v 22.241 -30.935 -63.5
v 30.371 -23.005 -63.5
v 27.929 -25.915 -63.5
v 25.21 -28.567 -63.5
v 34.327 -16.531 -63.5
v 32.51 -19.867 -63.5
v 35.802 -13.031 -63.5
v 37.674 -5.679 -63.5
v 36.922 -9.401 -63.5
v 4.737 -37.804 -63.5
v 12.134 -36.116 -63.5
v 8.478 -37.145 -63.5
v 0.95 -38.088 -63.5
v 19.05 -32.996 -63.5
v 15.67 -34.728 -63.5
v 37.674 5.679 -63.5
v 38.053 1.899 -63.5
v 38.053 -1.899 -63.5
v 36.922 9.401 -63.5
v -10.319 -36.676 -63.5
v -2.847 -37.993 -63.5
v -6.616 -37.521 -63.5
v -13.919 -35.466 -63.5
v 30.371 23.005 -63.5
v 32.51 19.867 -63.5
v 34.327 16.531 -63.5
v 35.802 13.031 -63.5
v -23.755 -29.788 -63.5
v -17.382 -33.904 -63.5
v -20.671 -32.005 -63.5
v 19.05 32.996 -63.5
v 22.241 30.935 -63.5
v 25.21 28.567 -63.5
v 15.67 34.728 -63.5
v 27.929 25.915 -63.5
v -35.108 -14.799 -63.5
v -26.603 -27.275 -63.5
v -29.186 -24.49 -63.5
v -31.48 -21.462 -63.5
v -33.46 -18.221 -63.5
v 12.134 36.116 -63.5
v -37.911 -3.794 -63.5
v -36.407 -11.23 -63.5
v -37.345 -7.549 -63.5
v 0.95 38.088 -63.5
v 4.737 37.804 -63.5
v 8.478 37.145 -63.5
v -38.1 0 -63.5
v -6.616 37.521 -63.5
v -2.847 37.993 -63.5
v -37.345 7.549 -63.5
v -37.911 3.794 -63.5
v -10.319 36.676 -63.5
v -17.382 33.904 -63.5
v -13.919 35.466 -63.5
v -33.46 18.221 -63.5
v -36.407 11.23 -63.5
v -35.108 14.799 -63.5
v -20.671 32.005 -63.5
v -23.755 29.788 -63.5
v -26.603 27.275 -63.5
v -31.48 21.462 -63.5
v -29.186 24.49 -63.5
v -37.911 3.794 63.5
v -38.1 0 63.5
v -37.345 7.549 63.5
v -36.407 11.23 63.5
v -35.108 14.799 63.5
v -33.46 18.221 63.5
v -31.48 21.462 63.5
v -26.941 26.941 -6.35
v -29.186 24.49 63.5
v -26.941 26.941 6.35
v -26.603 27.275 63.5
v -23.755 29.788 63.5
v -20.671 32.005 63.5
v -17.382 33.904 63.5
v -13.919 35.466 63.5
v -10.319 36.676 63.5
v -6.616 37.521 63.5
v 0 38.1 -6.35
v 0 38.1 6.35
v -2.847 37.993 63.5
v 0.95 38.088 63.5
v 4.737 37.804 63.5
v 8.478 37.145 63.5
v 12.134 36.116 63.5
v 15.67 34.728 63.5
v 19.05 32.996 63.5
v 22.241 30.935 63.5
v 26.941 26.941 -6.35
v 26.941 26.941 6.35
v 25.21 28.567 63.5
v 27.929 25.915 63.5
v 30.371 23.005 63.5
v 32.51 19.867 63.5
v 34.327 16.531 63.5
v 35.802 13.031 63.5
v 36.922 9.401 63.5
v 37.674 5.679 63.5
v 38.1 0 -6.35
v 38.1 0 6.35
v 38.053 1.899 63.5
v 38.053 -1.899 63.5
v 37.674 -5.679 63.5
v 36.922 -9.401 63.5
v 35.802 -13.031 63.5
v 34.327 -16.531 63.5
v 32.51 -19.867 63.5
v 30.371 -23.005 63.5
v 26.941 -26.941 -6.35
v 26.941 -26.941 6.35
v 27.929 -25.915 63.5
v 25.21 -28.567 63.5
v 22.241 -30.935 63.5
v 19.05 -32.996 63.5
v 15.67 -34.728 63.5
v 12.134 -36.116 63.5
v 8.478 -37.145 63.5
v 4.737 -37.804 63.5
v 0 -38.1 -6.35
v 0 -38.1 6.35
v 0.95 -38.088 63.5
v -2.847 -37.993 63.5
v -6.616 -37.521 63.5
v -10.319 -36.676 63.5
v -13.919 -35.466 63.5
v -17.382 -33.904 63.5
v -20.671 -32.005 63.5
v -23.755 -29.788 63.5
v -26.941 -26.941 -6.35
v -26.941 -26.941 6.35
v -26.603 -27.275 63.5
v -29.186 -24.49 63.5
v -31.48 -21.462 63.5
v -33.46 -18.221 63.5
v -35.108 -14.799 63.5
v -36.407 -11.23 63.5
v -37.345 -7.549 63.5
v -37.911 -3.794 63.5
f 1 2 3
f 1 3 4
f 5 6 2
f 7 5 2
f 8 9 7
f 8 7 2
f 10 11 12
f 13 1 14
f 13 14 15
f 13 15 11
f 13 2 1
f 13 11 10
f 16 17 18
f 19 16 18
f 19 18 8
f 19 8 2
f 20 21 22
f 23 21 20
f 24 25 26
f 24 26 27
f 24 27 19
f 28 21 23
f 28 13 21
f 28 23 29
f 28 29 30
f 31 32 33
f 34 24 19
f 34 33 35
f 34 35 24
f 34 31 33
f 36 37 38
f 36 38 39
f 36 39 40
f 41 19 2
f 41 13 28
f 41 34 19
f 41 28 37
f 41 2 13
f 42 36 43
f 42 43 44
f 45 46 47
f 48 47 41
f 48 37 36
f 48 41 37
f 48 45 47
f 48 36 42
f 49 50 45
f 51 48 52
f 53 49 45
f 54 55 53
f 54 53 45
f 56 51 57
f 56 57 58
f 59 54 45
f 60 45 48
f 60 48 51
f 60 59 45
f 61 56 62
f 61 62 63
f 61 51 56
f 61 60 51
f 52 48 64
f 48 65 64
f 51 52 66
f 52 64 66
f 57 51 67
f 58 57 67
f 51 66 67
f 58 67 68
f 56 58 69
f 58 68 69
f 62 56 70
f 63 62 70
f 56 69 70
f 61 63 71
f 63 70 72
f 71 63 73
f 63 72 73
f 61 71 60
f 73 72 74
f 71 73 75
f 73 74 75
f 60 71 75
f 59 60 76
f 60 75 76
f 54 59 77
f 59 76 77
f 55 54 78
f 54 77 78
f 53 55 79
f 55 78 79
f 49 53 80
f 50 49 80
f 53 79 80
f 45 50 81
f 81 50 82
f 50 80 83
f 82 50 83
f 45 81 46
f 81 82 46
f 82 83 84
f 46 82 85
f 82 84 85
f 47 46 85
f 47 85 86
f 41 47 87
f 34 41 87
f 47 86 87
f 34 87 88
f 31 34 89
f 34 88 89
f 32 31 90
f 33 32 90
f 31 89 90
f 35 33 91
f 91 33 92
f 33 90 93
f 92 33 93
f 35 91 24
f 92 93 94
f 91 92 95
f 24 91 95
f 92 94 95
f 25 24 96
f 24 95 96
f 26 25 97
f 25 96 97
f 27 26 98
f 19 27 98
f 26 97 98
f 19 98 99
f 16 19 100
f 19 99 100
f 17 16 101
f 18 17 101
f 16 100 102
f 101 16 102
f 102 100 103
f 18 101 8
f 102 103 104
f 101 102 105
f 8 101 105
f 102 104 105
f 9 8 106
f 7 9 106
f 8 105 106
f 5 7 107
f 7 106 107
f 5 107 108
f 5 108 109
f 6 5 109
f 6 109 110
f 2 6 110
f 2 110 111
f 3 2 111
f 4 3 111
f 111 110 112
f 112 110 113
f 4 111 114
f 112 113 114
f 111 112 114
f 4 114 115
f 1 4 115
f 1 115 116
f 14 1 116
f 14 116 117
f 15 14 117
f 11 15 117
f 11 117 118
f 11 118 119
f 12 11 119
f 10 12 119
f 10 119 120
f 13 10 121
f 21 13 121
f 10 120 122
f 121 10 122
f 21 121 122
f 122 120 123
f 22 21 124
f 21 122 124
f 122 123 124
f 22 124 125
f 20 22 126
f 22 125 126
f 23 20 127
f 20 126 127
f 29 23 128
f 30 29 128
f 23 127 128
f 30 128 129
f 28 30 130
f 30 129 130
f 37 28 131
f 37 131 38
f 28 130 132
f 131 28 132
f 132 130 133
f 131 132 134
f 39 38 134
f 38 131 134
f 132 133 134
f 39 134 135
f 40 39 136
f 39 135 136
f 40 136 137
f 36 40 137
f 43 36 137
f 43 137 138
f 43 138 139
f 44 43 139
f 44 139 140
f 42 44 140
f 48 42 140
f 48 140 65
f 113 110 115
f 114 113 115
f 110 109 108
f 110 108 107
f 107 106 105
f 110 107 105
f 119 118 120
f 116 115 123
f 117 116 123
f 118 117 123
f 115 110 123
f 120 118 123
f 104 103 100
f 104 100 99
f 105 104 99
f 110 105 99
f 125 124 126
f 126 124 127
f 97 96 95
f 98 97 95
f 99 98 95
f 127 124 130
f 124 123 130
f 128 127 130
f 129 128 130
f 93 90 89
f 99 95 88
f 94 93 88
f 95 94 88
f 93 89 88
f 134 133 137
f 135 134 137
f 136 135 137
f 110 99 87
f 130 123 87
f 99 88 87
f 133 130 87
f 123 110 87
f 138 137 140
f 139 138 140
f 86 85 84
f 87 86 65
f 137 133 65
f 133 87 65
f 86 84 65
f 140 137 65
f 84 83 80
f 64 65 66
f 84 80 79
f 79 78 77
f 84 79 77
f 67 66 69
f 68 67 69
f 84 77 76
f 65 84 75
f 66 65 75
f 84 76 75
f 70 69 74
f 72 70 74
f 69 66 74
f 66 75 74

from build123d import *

# Parameters (mm, degrees)
F0_W     = 38.1
F0_H     = 127
F3_R     = 6.35
F4_DEPTH = 12.7
F5_COUNT = 8


with BuildPart() as f1:
    # F0 (on Front) → F1 (revolve)
    with BuildSketch(Plane.XZ):
        with Locations((-19.05, 0)):
            Rectangle(F0_W, F0_H)
    revolve(axis=Axis((0, 0, 0), (0, 0, -1)))


with BuildPart() as f4:
    # F3 (on offset) → F4 (new body)
    with BuildSketch(Plane.XZ.offset(38.1)):
        Circle(F3_R)
    extrude(amount=F4_DEPTH)


with BuildPart() as f5_1:
    # F5: instance of F4
    add(f4.part.rotate(Axis((0, 0, 63.5), (0, 0, -1)), 1 * 360 / F5_COUNT))


with BuildPart() as f5_2:
    # F5: instance of F4
    add(f4.part.rotate(Axis((0, 0, 63.5), (0, 0, -1)), 2 * 360 / F5_COUNT))


with BuildPart() as f5_3:
    # F5: instance of F4
    add(f4.part.rotate(Axis((0, 0, 63.5), (0, 0, -1)), 3 * 360 / F5_COUNT))


with BuildPart() as f5_4:
    # F5: instance of F4
    add(f4.part.rotate(Axis((0, 0, 63.5), (0, 0, -1)), 4 * 360 / F5_COUNT))


with BuildPart() as f5_5:
    # F5: instance of F4
    add(f4.part.rotate(Axis((0, 0, 63.5), (0, 0, -1)), 5 * 360 / F5_COUNT))


with BuildPart() as f5_6:
    # F5: instance of F4
    add(f4.part.rotate(Axis((0, 0, 63.5), (0, 0, -1)), 6 * 360 / F5_COUNT))


with BuildPart() as f5_7:
    # F5: instance of F4
    add(f4.part.rotate(Axis((0, 0, 63.5), (0, 0, -1)), 7 * 360 / F5_COUNT))


with BuildPart() as f1_1:
    add(f1.part)

    # F6: cut F4, F5_1, F5_2, F5_3, F5_4, F5_5, F5_6, F5_7
    add(f4.part, mode=Mode.SUBTRACT)
    add(f5_1.part, mode=Mode.SUBTRACT)
    add(f5_2.part, mode=Mode.SUBTRACT)
    add(f5_3.part, mode=Mode.SUBTRACT)
    add(f5_4.part, mode=Mode.SUBTRACT)
    add(f5_5.part, mode=Mode.SUBTRACT)
    add(f5_6.part, mode=Mode.SUBTRACT)
    add(f5_7.part, mode=Mode.SUBTRACT)


solid = f1_1.part
